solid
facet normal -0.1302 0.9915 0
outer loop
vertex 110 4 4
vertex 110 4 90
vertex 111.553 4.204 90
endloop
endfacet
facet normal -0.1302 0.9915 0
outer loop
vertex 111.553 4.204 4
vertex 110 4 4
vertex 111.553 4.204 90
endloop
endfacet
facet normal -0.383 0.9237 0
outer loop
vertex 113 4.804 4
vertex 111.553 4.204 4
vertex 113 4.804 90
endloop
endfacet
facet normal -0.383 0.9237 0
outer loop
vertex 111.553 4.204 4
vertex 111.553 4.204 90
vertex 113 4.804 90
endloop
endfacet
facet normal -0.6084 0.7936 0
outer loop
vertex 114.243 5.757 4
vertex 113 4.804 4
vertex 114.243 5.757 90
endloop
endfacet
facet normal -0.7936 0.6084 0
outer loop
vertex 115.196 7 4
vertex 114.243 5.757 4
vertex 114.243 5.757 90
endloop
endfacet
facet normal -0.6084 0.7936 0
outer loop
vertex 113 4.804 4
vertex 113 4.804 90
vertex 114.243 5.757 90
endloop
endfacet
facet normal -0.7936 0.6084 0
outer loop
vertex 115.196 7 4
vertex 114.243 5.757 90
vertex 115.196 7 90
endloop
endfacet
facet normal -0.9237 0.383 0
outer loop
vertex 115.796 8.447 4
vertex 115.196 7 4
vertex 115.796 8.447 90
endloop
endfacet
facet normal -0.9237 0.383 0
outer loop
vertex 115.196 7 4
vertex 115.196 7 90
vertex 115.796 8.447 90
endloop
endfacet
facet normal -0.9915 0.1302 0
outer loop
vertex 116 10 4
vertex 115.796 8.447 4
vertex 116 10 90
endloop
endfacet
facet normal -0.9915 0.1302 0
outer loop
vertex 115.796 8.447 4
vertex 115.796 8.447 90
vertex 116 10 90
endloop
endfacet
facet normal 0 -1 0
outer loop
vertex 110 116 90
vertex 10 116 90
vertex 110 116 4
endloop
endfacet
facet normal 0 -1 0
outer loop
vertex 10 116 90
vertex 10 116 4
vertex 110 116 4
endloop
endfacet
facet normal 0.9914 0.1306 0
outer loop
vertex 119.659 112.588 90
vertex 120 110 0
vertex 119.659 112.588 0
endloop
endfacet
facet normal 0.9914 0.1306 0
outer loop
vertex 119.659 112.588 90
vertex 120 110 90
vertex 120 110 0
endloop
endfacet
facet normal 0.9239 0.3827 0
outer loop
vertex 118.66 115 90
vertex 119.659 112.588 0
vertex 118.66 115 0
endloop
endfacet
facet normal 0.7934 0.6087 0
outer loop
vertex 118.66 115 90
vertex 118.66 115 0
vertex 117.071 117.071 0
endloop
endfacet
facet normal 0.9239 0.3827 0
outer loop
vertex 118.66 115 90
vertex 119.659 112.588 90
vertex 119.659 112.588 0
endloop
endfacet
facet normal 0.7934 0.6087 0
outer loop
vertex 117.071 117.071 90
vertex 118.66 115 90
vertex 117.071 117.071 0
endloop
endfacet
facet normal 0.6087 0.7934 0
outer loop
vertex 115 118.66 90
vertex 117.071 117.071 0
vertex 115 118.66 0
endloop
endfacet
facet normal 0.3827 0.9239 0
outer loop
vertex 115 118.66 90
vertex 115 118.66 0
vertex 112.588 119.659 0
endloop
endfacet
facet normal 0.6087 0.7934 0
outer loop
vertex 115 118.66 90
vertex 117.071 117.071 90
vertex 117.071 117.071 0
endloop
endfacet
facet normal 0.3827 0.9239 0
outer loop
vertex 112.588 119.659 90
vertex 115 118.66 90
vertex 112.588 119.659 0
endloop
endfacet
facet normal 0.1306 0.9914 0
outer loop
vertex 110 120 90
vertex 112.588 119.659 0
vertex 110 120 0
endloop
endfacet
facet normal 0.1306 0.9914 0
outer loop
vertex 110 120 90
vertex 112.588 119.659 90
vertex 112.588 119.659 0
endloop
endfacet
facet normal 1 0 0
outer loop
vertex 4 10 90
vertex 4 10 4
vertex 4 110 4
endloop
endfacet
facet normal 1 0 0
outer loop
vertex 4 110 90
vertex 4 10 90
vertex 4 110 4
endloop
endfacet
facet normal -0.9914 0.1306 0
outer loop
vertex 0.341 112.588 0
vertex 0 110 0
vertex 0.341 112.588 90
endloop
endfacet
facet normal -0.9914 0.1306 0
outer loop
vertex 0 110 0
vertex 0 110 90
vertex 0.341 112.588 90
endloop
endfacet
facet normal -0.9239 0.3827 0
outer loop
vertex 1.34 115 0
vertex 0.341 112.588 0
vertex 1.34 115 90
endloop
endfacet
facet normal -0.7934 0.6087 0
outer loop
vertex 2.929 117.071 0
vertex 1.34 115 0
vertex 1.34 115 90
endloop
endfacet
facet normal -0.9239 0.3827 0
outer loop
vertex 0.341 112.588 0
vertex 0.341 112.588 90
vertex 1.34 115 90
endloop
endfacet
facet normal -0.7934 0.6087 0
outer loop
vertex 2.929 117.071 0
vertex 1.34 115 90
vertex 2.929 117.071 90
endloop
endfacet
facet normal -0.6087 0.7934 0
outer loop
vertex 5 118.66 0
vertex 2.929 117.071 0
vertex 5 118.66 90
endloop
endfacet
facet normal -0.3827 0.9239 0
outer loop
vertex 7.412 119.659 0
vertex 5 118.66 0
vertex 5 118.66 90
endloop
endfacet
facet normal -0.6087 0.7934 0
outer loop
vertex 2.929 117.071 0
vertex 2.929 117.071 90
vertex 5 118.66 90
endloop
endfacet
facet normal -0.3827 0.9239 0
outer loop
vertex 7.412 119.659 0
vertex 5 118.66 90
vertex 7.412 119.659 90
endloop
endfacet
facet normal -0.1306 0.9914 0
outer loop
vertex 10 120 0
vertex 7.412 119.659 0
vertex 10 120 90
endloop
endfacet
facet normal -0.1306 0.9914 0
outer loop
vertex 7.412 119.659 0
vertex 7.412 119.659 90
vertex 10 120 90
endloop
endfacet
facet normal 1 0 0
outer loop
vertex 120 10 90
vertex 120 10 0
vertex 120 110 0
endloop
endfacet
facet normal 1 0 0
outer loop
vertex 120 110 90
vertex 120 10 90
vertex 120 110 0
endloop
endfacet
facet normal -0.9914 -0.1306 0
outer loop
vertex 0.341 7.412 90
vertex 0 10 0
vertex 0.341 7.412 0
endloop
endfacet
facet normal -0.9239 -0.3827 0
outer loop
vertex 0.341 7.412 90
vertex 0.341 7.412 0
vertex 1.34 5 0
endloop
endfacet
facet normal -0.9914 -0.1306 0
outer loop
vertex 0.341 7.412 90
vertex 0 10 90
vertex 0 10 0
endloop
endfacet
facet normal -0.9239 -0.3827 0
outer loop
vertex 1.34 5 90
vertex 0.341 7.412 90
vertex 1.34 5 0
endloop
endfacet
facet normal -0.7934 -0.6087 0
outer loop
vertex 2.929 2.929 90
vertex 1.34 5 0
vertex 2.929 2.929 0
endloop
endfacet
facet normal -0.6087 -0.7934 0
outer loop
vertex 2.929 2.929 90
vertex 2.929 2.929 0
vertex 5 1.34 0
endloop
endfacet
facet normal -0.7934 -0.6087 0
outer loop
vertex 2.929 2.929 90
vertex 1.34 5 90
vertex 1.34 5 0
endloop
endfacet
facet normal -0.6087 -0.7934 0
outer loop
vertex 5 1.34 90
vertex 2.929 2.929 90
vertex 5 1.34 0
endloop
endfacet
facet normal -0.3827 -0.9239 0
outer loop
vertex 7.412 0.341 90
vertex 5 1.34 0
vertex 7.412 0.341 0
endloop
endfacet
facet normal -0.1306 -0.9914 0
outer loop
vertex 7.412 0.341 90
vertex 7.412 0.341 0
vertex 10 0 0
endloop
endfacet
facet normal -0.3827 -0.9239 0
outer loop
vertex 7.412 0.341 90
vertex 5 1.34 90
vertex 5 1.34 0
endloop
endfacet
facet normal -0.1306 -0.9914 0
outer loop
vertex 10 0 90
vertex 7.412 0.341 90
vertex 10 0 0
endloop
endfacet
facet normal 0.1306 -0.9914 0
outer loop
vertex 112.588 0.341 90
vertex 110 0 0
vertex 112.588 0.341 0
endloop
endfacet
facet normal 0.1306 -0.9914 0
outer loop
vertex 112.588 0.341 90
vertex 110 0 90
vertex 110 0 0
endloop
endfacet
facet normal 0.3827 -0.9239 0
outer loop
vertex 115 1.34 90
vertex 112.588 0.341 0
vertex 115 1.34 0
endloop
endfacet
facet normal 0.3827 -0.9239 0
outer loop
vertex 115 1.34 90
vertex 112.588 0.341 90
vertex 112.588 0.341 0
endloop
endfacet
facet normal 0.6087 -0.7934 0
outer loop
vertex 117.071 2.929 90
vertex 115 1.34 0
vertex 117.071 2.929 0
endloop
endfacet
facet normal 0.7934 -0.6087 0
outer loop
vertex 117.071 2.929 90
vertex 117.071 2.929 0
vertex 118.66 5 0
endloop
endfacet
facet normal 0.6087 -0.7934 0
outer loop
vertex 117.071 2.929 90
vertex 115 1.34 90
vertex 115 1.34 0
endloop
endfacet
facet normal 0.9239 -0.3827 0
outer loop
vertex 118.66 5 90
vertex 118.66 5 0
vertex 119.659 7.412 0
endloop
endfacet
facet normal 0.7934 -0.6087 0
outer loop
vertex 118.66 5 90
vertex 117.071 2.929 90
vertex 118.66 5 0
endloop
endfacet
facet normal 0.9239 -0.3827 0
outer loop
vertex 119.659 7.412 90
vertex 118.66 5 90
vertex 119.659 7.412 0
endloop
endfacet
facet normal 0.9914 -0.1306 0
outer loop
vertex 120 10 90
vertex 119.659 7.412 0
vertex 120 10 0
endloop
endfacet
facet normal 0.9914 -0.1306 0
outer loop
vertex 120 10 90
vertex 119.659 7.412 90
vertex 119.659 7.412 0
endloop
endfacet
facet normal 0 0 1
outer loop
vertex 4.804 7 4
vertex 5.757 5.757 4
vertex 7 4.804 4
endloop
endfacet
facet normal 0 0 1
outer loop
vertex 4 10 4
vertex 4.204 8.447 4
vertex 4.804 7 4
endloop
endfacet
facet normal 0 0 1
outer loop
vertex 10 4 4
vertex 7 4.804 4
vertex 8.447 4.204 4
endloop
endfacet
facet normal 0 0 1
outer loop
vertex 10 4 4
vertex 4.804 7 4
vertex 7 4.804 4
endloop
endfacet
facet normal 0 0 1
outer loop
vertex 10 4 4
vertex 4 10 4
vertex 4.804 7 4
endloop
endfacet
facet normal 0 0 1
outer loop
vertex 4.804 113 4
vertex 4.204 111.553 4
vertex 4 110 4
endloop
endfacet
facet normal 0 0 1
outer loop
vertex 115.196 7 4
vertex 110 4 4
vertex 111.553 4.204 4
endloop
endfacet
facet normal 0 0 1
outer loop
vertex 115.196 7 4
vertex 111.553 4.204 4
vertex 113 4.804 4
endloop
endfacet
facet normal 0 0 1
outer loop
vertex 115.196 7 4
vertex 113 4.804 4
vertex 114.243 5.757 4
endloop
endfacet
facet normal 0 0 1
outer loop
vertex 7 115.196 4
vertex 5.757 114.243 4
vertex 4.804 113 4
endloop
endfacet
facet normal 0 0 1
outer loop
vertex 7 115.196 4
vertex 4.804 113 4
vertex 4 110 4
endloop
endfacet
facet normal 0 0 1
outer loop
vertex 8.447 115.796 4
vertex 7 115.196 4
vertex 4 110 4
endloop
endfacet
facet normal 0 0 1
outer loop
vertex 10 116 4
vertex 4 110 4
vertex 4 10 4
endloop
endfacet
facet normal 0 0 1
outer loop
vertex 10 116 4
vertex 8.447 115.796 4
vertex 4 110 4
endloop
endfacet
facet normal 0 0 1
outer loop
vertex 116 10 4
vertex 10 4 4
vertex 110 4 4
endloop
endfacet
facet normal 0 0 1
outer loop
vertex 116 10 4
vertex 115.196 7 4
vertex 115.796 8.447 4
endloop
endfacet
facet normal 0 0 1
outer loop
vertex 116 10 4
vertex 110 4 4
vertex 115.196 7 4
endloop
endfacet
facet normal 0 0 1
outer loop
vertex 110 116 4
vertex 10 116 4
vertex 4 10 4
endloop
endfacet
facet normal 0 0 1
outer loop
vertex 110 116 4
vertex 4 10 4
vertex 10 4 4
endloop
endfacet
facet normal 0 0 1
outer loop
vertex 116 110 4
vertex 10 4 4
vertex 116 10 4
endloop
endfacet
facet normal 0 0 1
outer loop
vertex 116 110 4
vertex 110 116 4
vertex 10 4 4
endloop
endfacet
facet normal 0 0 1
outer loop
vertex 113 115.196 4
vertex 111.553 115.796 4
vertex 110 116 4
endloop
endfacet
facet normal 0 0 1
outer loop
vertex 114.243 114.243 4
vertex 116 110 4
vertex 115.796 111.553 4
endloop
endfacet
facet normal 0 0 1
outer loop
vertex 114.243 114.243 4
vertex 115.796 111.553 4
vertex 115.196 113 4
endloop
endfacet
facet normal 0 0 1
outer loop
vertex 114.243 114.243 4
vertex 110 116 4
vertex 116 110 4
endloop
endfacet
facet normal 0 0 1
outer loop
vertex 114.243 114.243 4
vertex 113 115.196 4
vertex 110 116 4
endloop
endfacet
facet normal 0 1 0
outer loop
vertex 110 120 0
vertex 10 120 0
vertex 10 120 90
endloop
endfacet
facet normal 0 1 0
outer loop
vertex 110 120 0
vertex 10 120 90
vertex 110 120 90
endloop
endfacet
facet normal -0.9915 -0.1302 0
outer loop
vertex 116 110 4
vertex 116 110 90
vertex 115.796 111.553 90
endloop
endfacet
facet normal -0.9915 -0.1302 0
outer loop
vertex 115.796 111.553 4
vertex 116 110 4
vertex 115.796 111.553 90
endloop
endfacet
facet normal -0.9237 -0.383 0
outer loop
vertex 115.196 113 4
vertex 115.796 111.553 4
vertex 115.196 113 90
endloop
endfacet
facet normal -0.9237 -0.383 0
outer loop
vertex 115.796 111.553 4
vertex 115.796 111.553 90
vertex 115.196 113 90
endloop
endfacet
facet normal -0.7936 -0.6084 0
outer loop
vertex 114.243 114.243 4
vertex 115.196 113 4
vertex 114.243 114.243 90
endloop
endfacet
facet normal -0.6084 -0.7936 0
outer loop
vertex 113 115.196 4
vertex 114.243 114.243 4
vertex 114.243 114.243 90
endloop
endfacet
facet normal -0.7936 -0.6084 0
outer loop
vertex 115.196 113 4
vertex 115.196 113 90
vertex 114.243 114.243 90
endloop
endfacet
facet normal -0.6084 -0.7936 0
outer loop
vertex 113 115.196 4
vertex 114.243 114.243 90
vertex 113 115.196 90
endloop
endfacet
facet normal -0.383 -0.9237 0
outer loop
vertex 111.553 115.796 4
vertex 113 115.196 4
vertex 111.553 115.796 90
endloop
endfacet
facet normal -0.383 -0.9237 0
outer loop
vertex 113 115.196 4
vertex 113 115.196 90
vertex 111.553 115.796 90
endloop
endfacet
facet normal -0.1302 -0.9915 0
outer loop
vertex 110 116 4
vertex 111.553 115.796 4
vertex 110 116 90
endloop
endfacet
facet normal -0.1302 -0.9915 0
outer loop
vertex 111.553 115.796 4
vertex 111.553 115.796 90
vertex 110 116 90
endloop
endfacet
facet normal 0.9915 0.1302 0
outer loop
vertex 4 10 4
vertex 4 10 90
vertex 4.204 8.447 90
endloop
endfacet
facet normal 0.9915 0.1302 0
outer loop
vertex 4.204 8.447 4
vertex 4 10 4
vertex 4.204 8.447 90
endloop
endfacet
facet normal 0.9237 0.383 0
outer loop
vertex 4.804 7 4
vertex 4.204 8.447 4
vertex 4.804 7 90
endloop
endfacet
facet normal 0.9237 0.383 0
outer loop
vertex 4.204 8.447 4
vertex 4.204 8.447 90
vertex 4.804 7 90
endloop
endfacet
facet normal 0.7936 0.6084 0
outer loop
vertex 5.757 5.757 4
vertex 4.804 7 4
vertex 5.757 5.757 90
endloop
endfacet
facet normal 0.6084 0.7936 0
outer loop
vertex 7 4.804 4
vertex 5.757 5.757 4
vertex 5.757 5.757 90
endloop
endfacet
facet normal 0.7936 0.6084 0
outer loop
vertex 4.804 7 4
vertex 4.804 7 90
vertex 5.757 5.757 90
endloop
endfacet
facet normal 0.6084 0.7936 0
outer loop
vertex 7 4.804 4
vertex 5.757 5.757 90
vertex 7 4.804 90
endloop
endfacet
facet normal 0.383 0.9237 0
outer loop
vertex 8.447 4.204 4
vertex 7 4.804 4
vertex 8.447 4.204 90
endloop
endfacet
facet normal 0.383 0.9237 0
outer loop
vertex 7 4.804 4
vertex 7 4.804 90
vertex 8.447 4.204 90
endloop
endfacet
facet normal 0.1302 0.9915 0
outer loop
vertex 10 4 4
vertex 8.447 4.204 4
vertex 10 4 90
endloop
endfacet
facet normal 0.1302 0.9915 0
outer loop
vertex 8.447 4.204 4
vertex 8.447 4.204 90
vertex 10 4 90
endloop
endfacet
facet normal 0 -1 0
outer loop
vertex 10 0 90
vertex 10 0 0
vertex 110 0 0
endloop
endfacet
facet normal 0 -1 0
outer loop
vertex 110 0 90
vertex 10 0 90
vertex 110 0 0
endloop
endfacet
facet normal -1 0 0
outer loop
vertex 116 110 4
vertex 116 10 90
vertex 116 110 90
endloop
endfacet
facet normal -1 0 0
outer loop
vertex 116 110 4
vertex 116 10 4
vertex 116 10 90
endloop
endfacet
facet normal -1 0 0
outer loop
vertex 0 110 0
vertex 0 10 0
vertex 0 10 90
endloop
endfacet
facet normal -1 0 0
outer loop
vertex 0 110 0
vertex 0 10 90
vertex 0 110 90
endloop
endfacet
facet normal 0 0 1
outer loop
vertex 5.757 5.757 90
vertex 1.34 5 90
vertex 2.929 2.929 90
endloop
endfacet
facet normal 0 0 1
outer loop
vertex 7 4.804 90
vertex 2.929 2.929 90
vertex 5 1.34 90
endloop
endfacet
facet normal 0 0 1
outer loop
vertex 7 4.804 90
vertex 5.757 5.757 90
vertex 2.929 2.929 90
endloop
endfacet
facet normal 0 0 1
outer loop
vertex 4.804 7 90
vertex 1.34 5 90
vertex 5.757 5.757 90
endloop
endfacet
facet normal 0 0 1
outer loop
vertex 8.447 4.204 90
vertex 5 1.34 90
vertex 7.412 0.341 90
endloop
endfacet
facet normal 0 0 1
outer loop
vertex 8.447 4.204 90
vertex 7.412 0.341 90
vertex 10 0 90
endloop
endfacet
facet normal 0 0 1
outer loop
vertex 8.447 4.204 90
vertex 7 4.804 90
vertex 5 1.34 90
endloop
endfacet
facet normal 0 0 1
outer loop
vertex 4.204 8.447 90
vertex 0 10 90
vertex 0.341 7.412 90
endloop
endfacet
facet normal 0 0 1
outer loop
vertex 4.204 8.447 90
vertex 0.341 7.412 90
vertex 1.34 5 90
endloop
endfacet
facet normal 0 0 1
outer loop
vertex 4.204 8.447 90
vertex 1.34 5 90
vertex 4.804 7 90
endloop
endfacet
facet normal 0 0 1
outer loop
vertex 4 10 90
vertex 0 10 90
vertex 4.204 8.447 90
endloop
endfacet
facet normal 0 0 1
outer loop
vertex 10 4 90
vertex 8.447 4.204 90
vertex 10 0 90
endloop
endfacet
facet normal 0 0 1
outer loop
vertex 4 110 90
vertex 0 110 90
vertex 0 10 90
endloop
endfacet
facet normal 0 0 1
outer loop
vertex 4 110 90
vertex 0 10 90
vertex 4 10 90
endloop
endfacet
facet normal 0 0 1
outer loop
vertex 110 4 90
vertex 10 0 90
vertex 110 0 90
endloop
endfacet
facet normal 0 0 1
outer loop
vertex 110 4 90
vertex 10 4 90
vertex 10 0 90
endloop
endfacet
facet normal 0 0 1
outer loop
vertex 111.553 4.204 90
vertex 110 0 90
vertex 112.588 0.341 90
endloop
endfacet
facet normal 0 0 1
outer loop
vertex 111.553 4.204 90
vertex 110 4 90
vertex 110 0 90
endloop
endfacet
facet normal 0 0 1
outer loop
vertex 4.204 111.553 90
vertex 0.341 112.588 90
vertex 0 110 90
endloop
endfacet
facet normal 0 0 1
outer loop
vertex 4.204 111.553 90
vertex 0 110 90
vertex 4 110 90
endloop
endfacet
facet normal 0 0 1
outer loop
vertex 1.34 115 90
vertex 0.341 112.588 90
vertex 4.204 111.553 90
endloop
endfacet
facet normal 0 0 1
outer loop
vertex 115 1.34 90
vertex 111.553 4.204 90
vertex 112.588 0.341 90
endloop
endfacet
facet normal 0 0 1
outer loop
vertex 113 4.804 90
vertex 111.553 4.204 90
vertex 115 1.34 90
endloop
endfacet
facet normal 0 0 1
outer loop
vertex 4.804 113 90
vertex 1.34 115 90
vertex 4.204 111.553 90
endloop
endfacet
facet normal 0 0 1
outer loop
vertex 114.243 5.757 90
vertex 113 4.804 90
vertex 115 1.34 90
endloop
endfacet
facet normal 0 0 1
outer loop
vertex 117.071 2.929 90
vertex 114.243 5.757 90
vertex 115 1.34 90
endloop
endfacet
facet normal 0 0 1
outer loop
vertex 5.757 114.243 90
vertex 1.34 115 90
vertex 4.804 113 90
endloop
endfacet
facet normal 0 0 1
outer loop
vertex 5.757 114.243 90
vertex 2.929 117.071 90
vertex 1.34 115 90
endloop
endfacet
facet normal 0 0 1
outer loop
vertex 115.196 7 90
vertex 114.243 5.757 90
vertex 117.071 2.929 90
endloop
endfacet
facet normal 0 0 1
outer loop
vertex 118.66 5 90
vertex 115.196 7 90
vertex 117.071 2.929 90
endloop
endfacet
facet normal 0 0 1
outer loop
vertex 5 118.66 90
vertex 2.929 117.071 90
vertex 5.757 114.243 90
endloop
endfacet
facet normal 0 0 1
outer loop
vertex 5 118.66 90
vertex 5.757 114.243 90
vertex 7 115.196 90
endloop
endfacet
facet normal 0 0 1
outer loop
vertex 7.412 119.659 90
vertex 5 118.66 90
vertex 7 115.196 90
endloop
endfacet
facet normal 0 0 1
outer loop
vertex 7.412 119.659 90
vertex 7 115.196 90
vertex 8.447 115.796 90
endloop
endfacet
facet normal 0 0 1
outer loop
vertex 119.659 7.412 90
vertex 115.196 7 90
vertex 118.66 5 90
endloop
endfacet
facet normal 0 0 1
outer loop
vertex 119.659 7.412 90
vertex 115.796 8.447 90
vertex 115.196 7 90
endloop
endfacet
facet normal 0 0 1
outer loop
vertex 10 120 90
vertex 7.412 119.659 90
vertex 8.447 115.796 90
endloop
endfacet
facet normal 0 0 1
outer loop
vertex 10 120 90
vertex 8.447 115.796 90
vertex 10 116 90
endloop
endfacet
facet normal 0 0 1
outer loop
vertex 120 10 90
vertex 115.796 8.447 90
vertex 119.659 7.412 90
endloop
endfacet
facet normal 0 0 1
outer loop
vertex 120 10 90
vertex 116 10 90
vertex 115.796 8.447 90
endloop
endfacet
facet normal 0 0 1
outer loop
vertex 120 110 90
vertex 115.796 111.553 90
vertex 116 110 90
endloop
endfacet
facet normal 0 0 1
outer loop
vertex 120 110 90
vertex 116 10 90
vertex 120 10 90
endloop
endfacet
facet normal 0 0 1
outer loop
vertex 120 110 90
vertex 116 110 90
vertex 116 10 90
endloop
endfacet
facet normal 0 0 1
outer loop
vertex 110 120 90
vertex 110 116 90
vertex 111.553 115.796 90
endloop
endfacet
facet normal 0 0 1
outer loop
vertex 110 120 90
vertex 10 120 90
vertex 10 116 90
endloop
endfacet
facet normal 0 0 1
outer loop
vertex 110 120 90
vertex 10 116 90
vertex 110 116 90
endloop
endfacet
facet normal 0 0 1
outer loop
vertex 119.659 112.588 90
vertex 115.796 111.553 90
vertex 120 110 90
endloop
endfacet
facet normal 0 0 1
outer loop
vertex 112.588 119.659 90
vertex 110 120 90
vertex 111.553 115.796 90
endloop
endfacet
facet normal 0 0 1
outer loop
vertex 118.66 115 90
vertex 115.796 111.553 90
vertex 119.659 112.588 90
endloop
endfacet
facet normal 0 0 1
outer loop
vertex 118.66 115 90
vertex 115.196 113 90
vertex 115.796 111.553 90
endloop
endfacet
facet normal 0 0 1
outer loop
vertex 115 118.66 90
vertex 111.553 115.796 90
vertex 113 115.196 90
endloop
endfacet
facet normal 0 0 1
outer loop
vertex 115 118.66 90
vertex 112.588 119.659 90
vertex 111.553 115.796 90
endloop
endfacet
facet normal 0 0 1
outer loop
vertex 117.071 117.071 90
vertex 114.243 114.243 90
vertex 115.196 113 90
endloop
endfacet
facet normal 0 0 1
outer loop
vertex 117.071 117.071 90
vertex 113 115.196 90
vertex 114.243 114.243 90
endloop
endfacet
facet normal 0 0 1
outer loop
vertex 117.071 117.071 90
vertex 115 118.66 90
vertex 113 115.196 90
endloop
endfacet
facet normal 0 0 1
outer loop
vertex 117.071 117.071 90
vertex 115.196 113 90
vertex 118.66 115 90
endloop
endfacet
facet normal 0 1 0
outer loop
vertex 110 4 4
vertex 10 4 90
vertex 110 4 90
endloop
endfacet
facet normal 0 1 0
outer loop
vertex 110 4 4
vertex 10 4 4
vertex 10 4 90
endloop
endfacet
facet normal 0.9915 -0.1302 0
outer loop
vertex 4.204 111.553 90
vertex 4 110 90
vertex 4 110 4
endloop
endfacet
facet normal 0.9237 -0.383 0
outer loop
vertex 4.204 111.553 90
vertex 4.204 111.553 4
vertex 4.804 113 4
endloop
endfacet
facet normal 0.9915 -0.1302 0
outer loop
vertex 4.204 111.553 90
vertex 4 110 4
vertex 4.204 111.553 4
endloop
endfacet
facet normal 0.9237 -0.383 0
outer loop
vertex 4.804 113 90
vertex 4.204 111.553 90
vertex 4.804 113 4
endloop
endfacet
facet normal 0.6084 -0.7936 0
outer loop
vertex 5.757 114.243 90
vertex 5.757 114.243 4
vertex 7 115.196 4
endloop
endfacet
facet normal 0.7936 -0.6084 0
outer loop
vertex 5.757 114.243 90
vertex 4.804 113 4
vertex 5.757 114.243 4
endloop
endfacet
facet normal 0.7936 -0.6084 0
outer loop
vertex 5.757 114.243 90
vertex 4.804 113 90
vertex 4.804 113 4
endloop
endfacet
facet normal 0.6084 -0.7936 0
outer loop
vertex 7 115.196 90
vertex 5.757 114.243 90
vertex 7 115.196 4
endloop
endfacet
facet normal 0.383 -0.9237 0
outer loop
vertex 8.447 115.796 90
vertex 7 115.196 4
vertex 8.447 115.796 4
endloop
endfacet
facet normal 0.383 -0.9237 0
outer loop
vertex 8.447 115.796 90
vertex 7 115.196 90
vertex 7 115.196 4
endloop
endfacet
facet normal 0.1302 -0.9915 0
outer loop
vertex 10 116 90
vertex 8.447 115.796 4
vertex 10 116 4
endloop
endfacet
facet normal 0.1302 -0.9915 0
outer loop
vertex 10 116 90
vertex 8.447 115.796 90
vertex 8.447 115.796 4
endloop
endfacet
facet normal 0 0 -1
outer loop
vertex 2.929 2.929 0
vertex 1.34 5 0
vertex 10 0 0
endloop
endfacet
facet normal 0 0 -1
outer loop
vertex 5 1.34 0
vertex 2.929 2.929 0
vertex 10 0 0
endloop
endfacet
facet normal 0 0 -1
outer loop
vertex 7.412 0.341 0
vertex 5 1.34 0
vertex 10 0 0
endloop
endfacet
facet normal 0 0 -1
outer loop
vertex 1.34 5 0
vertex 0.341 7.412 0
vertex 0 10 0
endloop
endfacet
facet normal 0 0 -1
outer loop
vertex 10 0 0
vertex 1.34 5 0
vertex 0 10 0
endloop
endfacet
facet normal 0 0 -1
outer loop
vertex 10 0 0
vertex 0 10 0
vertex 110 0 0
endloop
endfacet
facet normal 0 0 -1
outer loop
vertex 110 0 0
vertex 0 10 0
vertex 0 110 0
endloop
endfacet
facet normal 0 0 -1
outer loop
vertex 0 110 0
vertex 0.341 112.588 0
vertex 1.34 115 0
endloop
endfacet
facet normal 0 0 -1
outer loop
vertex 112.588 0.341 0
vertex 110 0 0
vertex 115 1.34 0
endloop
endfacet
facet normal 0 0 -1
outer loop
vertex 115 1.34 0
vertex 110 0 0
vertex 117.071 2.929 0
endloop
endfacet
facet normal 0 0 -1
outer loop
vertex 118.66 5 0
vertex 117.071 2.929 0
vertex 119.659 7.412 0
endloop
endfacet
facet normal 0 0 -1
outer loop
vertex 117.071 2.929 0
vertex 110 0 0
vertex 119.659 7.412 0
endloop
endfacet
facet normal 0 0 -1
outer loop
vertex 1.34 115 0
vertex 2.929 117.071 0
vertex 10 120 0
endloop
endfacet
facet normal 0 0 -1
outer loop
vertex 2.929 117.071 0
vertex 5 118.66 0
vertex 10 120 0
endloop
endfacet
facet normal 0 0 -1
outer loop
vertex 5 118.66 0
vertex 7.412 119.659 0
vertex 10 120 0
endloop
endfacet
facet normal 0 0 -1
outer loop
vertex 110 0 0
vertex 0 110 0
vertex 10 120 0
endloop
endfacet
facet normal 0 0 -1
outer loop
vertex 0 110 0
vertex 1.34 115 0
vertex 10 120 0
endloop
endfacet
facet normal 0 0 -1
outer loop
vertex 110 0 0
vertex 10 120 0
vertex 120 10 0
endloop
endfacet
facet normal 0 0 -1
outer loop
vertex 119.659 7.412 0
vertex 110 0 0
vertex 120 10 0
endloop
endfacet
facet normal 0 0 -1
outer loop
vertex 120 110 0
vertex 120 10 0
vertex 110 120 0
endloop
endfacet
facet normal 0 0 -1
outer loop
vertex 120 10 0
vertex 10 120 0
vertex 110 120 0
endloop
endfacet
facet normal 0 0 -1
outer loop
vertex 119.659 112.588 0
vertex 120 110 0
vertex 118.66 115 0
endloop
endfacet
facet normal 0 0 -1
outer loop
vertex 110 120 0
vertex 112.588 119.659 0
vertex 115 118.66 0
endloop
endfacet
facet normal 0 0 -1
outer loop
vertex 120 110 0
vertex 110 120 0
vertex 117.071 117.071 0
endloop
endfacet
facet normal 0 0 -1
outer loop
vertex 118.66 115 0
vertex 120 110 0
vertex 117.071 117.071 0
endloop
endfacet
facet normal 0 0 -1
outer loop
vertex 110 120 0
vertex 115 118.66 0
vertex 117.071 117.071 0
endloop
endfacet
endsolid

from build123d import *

# Parameters (mm, degrees)
SKETCH1_W           = 120
SKETCH1_H           = 120
BOSS_EXTRUDE1_DEPTH = 90
FILLET1_R           = 10
SHELL1_T            = -4


with BuildPart() as part:
    # Sketch1 → Boss-Extrude1 (new body)
    with BuildSketch(Plane.XY):
        with Locations((60, 60)):
            Rectangle(SKETCH1_W, SKETCH1_H)
    extrude(amount=BOSS_EXTRUDE1_DEPTH)

    # Fillet1
    fillet1_edges = [part.edges().sort_by_distance(p)[0] for p in [
        (0, 120, 45),
        (120, 120, 45),
        (120, 0, 45),
        (0, 0, 45),
    ]]
    fillet(fillet1_edges, radius=FILLET1_R)

    # Shell1
    shell1_openings = [part.faces().sort_by_distance(p)[0] for p in [
        (60, 60, 90),
    ]]
    offset(amount=SHELL1_T, openings=shell1_openings, kind=Kind.INTERSECTION)


solid = part.part
